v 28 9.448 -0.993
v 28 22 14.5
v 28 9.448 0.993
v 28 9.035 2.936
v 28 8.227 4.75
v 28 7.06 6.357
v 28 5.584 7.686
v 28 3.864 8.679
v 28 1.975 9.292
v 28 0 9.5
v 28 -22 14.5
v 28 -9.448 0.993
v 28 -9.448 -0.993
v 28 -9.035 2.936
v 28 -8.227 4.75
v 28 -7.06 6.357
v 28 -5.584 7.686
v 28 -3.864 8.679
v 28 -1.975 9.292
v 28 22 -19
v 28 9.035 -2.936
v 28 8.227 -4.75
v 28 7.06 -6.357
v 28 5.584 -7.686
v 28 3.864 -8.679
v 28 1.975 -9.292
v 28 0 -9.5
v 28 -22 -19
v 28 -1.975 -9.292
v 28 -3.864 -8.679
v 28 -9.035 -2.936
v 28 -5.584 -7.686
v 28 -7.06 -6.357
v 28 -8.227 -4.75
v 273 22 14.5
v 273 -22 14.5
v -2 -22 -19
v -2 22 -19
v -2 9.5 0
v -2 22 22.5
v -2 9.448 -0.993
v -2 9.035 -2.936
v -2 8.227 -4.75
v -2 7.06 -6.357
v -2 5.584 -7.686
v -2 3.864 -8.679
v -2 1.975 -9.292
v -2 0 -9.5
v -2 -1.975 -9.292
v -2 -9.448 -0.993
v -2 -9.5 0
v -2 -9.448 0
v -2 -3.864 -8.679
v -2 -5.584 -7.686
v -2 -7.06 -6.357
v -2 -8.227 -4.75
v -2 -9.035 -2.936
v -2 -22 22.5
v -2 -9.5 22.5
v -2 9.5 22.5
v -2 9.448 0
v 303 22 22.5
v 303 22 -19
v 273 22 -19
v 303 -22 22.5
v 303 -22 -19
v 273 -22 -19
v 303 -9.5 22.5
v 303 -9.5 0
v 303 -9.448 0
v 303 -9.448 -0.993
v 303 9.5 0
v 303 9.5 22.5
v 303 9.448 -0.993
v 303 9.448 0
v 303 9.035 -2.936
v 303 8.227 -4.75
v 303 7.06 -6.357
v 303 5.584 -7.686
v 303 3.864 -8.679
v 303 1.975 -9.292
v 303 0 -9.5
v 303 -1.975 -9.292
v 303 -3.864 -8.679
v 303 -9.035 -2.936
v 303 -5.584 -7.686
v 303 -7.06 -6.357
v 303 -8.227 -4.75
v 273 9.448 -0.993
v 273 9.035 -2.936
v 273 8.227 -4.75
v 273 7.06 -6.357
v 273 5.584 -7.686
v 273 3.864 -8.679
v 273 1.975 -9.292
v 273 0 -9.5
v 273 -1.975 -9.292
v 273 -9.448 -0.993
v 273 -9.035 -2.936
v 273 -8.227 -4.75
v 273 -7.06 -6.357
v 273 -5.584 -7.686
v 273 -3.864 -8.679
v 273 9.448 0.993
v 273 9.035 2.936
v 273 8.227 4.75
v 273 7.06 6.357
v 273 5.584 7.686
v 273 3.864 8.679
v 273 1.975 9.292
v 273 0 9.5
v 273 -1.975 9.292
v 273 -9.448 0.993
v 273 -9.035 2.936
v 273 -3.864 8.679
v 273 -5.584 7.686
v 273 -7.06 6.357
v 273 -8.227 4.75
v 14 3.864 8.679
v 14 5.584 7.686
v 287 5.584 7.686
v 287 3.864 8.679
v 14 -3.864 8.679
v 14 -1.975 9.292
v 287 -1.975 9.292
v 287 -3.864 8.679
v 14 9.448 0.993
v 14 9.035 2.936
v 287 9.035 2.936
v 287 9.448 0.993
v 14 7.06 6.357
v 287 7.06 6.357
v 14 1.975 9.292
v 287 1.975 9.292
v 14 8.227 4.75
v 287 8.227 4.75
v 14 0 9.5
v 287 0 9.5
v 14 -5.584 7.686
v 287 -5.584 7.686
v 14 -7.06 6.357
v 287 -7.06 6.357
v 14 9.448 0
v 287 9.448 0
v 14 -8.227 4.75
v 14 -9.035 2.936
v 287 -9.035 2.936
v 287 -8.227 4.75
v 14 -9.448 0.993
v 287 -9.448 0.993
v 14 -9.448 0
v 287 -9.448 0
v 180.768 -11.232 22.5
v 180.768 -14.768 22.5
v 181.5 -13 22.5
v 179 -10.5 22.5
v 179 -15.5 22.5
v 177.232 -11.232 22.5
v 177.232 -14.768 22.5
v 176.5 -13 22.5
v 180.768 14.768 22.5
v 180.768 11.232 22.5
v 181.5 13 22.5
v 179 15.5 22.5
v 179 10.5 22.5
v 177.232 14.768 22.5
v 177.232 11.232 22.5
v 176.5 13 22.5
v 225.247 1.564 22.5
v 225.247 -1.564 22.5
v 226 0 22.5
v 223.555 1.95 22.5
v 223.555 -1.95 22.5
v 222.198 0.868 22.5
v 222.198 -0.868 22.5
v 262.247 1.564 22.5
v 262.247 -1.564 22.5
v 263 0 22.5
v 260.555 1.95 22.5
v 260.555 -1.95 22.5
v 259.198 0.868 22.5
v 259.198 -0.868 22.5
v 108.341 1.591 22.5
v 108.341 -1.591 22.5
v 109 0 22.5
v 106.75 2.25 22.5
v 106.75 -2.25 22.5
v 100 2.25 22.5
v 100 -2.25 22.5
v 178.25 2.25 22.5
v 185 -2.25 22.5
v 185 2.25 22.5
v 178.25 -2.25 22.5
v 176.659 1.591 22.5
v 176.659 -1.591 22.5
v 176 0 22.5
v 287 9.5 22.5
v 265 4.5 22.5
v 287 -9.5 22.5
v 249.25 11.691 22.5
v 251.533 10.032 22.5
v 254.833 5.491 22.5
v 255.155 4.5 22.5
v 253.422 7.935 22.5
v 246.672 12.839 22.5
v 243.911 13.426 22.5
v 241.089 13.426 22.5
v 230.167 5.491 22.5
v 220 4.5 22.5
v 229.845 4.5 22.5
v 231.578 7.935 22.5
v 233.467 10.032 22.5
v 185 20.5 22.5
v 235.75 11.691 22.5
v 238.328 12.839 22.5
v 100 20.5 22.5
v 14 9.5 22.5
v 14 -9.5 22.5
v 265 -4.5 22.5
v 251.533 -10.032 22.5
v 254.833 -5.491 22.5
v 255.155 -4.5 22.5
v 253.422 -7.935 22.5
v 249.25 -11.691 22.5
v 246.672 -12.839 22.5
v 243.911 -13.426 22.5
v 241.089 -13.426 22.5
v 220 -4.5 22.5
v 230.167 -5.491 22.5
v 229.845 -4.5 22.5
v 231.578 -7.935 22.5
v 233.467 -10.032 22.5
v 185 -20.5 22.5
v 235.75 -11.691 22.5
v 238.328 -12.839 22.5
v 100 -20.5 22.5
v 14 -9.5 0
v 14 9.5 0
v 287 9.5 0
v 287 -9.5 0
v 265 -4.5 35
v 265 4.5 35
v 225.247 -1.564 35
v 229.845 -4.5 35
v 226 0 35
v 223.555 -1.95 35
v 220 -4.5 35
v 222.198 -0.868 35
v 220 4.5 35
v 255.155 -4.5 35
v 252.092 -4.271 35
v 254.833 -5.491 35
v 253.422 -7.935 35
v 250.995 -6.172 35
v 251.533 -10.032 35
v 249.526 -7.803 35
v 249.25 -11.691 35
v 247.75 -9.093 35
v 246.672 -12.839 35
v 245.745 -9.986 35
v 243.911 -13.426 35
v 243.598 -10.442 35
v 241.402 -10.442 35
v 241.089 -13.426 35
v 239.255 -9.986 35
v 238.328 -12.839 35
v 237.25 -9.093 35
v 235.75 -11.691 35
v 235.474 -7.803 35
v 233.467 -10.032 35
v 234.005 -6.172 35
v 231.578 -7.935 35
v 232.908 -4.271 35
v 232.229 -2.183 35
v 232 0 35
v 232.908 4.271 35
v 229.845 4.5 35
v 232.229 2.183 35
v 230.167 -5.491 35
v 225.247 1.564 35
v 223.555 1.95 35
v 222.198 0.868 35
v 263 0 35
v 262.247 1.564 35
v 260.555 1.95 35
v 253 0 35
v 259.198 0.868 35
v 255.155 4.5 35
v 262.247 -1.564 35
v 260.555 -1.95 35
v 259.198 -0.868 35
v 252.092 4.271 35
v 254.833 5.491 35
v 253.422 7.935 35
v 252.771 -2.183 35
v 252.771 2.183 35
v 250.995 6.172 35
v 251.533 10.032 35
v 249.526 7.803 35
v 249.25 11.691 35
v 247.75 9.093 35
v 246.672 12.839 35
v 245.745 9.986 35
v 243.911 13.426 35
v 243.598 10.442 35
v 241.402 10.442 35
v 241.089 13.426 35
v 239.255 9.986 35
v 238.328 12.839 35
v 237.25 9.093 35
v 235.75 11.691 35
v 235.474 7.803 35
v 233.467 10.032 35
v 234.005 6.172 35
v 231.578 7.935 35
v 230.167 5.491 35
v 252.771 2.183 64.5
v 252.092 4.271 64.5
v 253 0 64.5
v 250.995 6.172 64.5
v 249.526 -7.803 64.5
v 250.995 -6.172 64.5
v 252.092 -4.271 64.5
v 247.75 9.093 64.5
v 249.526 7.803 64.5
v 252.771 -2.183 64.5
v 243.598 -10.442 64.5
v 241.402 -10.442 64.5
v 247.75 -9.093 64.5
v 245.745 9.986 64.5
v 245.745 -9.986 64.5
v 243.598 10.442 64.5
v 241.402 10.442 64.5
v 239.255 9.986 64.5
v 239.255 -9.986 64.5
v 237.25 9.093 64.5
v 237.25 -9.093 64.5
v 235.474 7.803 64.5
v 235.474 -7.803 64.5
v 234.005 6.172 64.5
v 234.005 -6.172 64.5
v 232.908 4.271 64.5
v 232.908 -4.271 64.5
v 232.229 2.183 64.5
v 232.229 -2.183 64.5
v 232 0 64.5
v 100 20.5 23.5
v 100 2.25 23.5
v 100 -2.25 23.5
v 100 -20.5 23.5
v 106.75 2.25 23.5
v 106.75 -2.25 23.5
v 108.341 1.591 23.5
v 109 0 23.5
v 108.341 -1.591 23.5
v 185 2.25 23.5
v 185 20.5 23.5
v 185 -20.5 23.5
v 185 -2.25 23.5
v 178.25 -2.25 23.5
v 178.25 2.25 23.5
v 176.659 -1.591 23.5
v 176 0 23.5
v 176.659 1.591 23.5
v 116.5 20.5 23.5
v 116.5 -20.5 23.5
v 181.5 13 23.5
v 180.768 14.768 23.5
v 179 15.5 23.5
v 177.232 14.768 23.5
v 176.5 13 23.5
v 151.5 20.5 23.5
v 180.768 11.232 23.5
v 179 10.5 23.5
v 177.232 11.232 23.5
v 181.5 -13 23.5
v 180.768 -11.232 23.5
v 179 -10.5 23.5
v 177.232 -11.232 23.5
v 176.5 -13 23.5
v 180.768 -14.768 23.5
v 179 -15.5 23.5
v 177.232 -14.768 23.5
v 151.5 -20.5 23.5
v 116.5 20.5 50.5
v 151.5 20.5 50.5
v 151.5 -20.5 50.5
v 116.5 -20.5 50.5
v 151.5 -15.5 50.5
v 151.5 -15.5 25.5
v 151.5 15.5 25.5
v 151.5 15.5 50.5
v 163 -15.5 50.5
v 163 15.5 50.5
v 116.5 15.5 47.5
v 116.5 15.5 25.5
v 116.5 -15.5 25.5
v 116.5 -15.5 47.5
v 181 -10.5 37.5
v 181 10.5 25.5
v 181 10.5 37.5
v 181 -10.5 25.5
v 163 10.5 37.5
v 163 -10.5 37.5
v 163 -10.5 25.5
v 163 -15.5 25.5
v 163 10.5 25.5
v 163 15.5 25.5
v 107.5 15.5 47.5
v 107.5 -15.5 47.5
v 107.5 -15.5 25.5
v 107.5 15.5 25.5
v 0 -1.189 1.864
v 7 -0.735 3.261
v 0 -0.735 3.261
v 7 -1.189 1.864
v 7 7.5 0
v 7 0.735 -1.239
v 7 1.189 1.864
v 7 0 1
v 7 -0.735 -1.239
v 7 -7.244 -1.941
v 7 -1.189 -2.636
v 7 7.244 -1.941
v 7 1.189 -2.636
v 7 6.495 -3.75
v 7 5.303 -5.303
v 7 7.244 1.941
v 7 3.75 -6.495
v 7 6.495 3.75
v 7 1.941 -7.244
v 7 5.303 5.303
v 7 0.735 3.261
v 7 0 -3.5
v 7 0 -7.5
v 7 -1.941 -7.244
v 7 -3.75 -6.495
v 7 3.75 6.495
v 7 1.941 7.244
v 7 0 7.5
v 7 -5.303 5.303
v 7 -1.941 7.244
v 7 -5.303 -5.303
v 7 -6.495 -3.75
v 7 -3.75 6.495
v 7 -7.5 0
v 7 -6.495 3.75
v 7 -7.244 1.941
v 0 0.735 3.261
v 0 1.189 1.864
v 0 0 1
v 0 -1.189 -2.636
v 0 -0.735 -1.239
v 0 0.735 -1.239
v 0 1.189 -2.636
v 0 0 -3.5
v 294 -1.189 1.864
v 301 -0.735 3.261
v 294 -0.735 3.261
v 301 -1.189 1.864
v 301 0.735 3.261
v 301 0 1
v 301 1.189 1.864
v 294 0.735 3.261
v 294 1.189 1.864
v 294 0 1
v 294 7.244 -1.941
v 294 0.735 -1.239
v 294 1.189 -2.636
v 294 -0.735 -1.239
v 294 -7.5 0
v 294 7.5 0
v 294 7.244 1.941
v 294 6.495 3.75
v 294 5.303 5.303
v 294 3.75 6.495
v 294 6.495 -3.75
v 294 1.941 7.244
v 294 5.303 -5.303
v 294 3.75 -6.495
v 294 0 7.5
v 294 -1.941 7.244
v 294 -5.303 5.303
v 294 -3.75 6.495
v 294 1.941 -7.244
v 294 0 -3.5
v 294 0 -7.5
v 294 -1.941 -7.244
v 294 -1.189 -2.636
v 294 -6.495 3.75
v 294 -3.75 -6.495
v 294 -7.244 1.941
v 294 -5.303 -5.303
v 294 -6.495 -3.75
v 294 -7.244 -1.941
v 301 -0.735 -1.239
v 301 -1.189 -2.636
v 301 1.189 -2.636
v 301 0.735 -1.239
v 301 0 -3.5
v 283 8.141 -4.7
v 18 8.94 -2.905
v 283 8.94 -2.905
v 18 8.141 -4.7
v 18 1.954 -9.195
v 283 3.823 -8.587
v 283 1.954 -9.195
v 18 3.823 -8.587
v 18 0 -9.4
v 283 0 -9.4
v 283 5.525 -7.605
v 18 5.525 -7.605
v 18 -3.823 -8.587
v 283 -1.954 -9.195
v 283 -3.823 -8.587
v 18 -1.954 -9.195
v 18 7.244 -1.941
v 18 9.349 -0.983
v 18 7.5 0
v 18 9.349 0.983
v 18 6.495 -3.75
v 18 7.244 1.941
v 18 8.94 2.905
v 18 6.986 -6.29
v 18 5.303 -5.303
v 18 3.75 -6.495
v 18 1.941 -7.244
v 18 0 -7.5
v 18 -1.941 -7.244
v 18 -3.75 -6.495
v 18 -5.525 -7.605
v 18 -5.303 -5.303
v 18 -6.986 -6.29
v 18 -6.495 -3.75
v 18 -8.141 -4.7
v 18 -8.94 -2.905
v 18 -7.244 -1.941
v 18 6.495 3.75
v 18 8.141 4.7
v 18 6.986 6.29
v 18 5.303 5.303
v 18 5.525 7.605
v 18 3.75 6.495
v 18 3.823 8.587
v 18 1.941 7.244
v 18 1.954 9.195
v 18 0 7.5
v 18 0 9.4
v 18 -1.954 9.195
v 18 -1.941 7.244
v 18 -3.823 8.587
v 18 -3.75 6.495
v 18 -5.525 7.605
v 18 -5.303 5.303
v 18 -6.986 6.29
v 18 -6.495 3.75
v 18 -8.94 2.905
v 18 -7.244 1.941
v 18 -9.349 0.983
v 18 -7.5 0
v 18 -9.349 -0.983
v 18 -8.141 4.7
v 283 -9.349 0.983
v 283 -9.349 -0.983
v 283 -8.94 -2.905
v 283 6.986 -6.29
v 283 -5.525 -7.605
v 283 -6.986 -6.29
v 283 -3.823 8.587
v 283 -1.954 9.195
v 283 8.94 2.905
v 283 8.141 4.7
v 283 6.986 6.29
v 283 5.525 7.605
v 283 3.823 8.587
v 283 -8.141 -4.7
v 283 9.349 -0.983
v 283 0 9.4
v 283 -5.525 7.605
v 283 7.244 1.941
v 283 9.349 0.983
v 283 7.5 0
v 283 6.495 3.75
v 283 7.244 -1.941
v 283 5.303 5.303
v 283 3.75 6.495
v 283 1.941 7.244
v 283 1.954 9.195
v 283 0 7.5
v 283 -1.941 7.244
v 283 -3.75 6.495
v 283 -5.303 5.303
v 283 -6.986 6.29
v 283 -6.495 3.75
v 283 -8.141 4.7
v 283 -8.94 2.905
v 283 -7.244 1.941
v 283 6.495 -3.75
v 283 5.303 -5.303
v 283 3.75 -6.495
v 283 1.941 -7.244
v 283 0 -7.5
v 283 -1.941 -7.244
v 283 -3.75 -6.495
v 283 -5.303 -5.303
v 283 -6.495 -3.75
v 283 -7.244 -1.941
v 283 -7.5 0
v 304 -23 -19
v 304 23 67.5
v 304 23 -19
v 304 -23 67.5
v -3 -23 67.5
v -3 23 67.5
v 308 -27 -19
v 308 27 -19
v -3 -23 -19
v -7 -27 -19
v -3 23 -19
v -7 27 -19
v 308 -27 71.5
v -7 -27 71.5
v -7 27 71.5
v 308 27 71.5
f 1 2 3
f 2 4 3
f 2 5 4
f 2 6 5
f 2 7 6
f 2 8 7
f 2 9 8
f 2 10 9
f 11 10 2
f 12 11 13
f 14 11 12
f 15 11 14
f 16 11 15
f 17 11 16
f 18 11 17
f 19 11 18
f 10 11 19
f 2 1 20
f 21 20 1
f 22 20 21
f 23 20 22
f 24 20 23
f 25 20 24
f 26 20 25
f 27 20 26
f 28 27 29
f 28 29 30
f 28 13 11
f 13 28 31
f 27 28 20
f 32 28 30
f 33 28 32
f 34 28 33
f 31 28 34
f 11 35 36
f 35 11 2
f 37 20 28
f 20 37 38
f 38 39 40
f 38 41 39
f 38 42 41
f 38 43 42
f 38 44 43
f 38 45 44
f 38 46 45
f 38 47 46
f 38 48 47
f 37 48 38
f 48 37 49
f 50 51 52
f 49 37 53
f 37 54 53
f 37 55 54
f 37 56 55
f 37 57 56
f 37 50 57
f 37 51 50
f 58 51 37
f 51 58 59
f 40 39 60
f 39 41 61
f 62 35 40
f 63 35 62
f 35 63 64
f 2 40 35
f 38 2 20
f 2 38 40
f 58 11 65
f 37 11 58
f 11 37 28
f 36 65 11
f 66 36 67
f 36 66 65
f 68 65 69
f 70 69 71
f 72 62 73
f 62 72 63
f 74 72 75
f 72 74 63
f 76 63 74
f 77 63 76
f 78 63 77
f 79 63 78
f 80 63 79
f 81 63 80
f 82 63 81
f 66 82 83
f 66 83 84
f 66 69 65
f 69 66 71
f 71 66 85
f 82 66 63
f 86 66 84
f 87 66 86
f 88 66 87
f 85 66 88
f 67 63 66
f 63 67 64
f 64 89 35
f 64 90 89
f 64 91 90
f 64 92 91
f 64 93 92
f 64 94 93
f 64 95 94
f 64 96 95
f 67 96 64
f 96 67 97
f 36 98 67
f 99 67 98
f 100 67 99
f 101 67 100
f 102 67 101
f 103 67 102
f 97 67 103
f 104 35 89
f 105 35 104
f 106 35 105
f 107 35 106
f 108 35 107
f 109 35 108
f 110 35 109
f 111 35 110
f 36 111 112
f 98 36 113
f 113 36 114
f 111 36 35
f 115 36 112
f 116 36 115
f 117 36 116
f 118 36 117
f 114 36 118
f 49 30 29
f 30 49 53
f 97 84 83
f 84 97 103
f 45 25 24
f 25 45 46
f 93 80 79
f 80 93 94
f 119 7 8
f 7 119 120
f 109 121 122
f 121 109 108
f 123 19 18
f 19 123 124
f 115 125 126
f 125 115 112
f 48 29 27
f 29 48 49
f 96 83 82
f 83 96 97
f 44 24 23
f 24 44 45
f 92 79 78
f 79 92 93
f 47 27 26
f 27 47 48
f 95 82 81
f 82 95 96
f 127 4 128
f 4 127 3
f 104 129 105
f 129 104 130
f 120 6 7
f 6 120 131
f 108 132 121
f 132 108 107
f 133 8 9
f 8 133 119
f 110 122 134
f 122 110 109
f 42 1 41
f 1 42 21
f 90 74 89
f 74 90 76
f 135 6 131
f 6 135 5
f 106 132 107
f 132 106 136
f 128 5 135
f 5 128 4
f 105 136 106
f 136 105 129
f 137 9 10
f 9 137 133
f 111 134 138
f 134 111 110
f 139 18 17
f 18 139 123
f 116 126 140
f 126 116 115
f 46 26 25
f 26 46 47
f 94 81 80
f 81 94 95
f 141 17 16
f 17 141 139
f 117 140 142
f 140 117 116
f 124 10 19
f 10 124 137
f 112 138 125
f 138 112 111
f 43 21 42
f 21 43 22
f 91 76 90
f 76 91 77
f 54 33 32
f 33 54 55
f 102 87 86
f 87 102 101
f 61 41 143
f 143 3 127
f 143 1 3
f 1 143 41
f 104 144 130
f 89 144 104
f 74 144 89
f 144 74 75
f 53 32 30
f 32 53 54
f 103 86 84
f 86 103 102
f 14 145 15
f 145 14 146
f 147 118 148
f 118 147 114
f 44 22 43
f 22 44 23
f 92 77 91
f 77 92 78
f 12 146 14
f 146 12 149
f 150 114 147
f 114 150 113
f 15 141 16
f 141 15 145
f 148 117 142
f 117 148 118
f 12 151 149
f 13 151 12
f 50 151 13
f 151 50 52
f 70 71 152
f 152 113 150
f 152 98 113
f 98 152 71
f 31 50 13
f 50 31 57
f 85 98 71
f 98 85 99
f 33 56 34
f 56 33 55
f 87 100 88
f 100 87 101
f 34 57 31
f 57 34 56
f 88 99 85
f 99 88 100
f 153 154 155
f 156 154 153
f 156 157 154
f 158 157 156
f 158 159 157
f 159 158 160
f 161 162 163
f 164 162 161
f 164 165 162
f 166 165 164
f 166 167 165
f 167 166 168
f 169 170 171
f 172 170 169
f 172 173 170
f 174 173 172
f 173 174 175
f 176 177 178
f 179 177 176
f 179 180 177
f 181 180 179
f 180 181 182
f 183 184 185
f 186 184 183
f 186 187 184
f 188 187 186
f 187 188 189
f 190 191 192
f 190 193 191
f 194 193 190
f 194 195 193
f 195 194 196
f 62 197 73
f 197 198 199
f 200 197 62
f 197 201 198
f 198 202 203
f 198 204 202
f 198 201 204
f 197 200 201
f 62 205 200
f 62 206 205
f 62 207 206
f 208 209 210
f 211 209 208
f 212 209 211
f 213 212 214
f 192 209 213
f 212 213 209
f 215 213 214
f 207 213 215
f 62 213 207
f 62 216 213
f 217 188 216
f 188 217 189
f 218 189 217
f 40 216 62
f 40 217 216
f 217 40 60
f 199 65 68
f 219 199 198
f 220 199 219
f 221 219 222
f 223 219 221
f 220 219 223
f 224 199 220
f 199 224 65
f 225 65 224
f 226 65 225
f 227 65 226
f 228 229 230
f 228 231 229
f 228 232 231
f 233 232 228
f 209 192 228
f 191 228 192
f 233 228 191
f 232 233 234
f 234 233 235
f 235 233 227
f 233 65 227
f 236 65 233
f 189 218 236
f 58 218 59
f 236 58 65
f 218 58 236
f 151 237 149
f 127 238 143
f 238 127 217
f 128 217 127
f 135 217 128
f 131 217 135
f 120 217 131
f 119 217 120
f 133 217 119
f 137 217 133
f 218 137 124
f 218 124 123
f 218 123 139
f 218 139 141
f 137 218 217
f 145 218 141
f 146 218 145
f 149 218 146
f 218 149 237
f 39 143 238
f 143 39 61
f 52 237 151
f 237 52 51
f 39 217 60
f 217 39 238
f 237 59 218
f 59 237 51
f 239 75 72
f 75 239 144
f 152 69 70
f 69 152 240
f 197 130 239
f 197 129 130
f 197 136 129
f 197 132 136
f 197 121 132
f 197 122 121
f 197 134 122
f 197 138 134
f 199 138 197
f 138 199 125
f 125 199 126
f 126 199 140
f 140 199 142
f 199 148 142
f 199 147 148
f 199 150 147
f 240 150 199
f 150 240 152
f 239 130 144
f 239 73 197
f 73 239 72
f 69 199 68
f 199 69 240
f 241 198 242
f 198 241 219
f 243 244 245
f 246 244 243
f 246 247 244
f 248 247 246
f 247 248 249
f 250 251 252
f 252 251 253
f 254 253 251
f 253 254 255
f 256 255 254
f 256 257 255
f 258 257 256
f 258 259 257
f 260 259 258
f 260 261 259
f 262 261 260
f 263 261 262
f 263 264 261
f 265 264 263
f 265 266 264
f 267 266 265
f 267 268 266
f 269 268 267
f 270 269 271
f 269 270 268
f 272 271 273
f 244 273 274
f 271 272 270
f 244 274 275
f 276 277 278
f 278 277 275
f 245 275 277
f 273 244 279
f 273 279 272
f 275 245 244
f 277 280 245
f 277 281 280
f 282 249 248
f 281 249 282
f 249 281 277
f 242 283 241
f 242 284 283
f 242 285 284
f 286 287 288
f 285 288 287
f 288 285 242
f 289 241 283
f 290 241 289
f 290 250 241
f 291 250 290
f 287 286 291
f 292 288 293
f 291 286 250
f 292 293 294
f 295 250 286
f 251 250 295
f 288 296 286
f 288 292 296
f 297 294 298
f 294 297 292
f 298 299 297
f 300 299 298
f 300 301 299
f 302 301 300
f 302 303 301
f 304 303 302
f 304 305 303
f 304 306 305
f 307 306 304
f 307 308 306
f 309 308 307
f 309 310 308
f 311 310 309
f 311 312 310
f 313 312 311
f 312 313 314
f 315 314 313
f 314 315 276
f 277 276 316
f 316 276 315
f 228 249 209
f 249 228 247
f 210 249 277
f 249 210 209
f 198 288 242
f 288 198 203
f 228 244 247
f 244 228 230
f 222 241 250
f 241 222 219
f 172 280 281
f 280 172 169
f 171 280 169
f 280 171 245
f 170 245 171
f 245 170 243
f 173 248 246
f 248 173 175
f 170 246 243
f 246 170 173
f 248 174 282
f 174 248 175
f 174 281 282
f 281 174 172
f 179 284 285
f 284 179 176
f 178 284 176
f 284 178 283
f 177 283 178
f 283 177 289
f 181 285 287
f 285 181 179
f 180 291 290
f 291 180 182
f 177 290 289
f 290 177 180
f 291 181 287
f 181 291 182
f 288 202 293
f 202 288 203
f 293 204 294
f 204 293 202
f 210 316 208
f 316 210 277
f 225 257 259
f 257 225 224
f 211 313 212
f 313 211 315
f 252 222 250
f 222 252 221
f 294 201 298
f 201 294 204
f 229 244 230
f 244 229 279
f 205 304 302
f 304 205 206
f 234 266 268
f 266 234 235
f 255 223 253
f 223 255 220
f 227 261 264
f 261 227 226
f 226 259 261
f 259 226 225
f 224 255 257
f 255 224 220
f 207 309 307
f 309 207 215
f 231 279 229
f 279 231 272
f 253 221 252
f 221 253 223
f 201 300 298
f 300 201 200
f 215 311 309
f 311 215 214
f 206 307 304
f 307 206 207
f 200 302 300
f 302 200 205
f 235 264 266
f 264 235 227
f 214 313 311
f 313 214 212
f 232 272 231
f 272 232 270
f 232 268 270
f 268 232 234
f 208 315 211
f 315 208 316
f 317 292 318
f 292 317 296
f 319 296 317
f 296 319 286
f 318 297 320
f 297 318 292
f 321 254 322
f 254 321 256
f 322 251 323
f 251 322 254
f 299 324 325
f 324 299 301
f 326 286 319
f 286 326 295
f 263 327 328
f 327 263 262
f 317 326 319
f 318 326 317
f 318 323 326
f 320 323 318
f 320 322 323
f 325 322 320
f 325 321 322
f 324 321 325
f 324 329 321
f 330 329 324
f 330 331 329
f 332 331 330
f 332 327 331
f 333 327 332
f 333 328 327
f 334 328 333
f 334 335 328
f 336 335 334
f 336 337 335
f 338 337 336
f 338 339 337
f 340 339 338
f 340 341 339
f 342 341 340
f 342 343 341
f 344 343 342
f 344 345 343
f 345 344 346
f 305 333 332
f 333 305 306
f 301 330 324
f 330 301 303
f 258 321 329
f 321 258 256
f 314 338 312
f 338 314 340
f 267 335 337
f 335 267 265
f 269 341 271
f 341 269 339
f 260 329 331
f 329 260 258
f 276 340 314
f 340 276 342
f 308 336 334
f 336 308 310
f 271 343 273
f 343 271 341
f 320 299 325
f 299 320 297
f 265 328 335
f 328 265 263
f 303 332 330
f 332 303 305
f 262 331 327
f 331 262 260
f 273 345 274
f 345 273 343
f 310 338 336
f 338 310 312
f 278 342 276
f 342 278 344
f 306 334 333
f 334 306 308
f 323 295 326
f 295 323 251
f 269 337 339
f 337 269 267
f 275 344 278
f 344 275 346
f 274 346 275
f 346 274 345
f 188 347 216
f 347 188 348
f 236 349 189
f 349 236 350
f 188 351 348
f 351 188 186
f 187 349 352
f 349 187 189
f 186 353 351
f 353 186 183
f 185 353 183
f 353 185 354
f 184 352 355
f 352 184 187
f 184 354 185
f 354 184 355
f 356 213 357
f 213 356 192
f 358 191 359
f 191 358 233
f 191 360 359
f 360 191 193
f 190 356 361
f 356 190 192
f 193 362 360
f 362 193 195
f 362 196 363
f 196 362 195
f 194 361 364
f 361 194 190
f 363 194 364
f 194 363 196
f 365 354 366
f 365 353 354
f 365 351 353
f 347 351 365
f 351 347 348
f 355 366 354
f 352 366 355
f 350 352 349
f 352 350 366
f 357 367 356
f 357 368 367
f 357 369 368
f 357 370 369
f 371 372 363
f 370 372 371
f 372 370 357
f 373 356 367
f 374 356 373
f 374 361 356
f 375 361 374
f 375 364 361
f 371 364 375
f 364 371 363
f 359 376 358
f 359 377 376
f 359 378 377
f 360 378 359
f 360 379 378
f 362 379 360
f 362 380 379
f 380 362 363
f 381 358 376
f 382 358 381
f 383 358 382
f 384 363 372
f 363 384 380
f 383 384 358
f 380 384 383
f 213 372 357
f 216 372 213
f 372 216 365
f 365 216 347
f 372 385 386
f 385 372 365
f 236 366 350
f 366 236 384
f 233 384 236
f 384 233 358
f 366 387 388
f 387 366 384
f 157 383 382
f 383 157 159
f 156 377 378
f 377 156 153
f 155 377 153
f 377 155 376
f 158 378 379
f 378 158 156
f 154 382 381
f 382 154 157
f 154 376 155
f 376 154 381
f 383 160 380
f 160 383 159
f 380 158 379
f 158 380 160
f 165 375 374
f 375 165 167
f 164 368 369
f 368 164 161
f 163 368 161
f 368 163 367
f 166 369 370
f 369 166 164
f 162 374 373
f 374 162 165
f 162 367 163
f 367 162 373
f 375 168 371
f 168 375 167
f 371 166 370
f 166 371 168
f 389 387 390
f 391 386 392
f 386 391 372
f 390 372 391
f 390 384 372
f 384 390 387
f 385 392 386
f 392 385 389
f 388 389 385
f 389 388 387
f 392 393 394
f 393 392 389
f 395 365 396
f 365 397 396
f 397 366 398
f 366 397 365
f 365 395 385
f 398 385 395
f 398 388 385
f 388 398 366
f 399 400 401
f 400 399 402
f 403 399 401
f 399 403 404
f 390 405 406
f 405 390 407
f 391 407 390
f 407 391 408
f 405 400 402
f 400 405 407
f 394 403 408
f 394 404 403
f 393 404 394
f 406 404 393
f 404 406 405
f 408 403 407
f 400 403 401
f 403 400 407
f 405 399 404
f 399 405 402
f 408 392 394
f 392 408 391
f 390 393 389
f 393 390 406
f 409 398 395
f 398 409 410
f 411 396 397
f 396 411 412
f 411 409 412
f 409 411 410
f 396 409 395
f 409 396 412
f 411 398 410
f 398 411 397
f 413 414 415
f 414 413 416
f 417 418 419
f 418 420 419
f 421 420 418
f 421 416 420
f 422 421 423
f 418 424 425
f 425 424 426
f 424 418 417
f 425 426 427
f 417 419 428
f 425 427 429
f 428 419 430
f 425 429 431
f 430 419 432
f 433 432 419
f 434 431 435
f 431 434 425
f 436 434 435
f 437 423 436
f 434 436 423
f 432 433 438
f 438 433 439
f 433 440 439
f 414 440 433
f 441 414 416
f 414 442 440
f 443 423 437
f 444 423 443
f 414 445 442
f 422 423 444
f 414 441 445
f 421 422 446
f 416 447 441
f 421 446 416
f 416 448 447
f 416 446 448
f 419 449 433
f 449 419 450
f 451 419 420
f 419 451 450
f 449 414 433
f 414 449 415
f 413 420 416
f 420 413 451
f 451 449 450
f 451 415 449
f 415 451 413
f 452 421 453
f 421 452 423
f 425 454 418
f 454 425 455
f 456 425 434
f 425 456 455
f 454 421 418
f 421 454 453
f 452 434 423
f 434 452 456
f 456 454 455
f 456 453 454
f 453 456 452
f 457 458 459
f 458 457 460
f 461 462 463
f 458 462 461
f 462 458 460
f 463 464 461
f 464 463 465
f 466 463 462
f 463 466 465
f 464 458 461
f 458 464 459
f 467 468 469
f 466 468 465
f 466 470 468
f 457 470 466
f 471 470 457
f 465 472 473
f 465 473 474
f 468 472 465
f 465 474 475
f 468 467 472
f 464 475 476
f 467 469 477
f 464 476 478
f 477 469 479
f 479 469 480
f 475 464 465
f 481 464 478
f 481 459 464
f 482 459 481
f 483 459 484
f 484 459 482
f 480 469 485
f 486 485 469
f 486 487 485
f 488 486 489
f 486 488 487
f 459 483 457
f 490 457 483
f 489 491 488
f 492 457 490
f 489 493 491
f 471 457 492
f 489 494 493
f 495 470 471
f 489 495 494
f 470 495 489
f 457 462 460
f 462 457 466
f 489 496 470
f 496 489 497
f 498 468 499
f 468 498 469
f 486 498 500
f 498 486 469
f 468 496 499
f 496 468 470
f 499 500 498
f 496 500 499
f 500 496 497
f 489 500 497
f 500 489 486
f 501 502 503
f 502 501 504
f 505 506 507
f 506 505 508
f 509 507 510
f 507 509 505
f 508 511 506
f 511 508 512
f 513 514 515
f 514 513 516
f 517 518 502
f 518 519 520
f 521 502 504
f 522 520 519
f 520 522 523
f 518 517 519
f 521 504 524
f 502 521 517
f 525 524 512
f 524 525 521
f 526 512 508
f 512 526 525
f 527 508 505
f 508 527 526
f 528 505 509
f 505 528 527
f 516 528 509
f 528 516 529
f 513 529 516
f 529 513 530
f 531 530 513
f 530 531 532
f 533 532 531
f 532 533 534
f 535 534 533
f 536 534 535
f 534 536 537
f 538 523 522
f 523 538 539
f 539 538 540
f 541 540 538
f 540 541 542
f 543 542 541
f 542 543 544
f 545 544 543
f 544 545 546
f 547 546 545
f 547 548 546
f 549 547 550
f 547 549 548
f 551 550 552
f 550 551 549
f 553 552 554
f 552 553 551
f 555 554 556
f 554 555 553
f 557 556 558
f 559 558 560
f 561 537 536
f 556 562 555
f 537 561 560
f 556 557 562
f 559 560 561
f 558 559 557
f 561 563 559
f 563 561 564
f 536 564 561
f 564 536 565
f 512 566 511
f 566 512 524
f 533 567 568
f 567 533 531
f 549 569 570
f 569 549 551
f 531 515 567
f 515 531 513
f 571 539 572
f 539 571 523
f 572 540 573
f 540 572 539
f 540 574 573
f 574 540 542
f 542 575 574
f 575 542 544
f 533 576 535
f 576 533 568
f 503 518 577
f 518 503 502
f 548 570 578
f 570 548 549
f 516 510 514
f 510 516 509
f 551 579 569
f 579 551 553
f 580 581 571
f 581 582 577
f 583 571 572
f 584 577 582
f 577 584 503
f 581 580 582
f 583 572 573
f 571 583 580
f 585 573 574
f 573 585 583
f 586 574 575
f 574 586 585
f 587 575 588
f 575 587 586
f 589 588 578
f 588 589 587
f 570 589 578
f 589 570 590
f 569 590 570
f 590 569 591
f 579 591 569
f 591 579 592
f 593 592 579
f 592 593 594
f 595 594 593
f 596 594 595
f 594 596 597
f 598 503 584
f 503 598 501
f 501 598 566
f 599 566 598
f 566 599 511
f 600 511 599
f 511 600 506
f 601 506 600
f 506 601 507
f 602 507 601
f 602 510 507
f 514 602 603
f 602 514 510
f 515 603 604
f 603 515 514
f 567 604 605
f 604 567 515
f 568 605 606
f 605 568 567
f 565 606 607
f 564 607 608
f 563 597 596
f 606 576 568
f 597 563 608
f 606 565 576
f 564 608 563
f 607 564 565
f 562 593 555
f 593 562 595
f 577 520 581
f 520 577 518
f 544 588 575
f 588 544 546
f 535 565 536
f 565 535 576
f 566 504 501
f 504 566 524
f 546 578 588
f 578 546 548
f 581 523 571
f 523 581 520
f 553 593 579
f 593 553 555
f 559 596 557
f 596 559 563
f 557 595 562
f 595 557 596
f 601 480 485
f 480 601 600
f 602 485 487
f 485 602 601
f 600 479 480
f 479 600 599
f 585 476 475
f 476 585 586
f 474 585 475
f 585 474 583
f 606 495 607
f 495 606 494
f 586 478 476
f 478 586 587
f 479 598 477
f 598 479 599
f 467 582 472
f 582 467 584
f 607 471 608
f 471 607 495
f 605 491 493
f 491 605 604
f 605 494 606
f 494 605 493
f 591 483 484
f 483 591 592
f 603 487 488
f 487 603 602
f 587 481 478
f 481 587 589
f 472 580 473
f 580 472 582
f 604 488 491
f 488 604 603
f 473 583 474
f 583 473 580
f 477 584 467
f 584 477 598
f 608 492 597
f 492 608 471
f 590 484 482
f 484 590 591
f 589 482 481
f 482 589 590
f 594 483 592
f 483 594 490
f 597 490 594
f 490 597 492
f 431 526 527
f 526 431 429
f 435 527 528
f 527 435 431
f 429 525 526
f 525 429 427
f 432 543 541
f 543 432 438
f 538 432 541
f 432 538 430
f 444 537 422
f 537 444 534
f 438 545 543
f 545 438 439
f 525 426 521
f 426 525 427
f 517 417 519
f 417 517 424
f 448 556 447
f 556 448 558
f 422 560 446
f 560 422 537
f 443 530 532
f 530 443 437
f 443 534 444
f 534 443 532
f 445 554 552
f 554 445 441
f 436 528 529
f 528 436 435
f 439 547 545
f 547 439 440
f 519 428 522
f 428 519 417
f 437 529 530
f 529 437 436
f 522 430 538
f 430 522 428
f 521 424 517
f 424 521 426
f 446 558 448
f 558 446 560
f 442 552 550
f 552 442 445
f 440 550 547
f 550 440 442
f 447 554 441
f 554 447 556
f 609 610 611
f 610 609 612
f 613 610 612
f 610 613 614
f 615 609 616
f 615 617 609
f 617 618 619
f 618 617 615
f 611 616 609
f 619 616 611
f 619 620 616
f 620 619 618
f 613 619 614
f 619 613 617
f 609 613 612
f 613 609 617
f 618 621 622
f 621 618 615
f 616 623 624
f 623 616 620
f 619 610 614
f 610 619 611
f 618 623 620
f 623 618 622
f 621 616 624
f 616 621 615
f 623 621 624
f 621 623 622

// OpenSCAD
// file: componentes.scad
module tubo_germicida() {
    LONGITUD_VIDRIO = 265;
    DIAMETRO_VIDRIO = 18.8;
    LONGITUD_METAL = 11;
    DIAMETRO_METAL = 15;
    LONGITUD_PIN = 7;
    DIAMETRO_PIN = 2.5;
    SEPARACION_PIN = 4.5;
    module pin() {
        cylinder(h=LONGITUD_PIN, d=DIAMETRO_PIN);
    }
    module metalsito() {
        color([1,1,1]*.8)
        cylinder(h=LONGITUD_METAL, d=DIAMETRO_METAL);
    }
    module tubo_de_vidrio() {
        color([1,1,1], alpha=.4)
        cylinder(h=LONGITUD_VIDRIO, d=DIAMETRO_VIDRIO);
    }
    
    translate([-SEPARACION_PIN/2,0,0])
        pin();
    translate([SEPARACION_PIN/2,0,0])
        pin();
    translate([-SEPARACION_PIN/2,0,2*LONGITUD_METAL+LONGITUD_VIDRIO+LONGITUD_PIN])
        pin();
    translate([SEPARACION_PIN/2,0,2*LONGITUD_METAL+LONGITUD_VIDRIO+LONGITUD_PIN])
        pin();
    
    translate([0,0,LONGITUD_METAL+LONGITUD_PIN])
        tubo_de_vidrio();

    translate([0,0,LONGITUD_METAL+LONGITUD_VIDRIO+LONGITUD_PIN])
        metalsito();
    translate([0,0,LONGITUD_PIN])
        metalsito();
}

module reactancia() {
    module ranura() {
        translate([0,0,-1]) {
            cube([9-4.5/2,4.5,3]);
            translate([9-4.5/2,4.5/2,0])
                cylinder(h=3,d=4.5);
        }
    }
    module agujero() {
        translate([0,0,-1])
            cylinder(h=3,d=5);
    }
    color([1,1,1]) {
        difference() {
            cube([85,41,1]);
            translate([0,41/2-4.5/2,0])
                ranura();
            translate([85,41/2+4.5/2,0])
                rotate(a=180,v=[0,0,1])
                    ranura();
            translate([76.5+5/2,5+5/2,0])
                agujero();
            translate([76.5+5/2,41-5-5/2,0])
                agujero();
        }
        translate([16.5,0,0])
            cube([35,41,28]);
        translate([63,41/2-21/2,3])
            cube([18,21,12]);
        translate([51,(41-31)/2,3])
            cube([12,31,25]);
        translate([16.5-9,(41-31)/2,3])
            cube([9,31,22]);
    }
}

module arrancador() {
    color([.3,.4,1], alpha=.5)
        cylinder(h=35,d=21);
}

module zocalo_arrancador() {
    color([1,1,1]) {
        difference() {
            cube([45,9,12.5]);
            translate([45/2-37/2,9/2,-1])
                cylinder(h=15,d=4);
            translate([45/2+37/2,9/2,-1])
                cylinder(h=15,d=4);
        }
        translate([45/2,9/2,0])
            cylinder(h=12.5,d=27);
    }
}

module zocalo_con_arrancador() {
    zocalo_arrancador();
    translate([45/2,9/2,42-35])
        arrancador();
}
// main file
use <componentes.scad>

DIAMETRO_TUBO = 19;
LONGITUD_TUBO = 265+2*11+2*7;
ESPESOR_MINIMO = 4;
EXCESO_LONGITUDINAL = 2;
ANCHO_INTERNO_Y = 44;
ALTO_INTERNO_Z = 45;
ESPESOR_BASE = 8;
SEPARACION_BASE_TUBO = 5;
DISTANCIA_CUBRIR_TUBO = 11+7+10;
LUZ_TAPA_BASE = 1;
POSICION_ARRANCADOR_X = 220;
POSICION_REACTANCIA_X = 100;

module gabinete_base() {
    difference() {
        union() {
            translate([-EXCESO_LONGITUDINAL,-ANCHO_INTERNO_Y/2,SEPARACION_BASE_TUBO+DIAMETRO_TUBO/2])
                cube([LONGITUD_TUBO+2*EXCESO_LONGITUDINAL,ANCHO_INTERNO_Y, ESPESOR_BASE]);
            
            difference() {
                translate([0,-ANCHO_INTERNO_Y/2,DIAMETRO_TUBO/2+SEPARACION_BASE_TUBO-(DIAMETRO_TUBO/2+SEPARACION_BASE_TUBO+DIAMETRO_TUBO)]) {
                    translate([-EXCESO_LONGITUDINAL,0,0])
                        cube([EXCESO_LONGITUDINAL+DISTANCIA_CUBRIR_TUBO,ANCHO_INTERNO_Y,DIAMETRO_TUBO/2+SEPARACION_BASE_TUBO+DIAMETRO_TUBO]);
                    translate([LONGITUD_TUBO+EXCESO_LONGITUDINAL-(EXCESO_LONGITUDINAL+DISTANCIA_CUBRIR_TUBO),0,0])
                        cube([EXCESO_LONGITUDINAL+DISTANCIA_CUBRIR_TUBO,ANCHO_INTERNO_Y,DIAMETRO_TUBO/2+SEPARACION_BASE_TUBO+DIAMETRO_TUBO]);
                }
                translate([-EXCESO_LONGITUDINAL-1,0,0])
                rotate(a=90,v=[0,1,0])
                    cylinder(h=LONGITUD_TUBO+2*EXCESO_LONGITUDINAL+2,d=DIAMETRO_TUBO);
            }
        }
        translate([0,-DIAMETRO_TUBO/2,0]) {
        translate([-EXCESO_LONGITUDINAL,0,0])
            cube([EXCESO_LONGITUDINAL+DISTANCIA_CUBRIR_TUBO/2,DIAMETRO_TUBO,DIAMETRO_TUBO/2+SEPARACION_BASE_TUBO+ESPESOR_BASE]);
        translate([LONGITUD_TUBO+EXCESO_LONGITUDINAL-(EXCESO_LONGITUDINAL+DISTANCIA_CUBRIR_TUBO/2),0,0])
            cube([EXCESO_LONGITUDINAL+DISTANCIA_CUBRIR_TUBO/2,DIAMETRO_TUBO,DIAMETRO_TUBO/2+SEPARACION_BASE_TUBO+ESPESOR_BASE]);
        }
    }
}

module gabinete_tapa() {
    altura_tapa = SEPARACION_BASE_TUBO+3/2*DIAMETRO_TUBO+ESPESOR_BASE+ALTO_INTERNO_Z;
    offset_z = -DIAMETRO_TUBO/2-DIAMETRO_TUBO/2;
    translate([-LUZ_TAPA_BASE-EXCESO_LONGITUDINAL,-LUZ_TAPA_BASE-ANCHO_INTERNO_Y/2-ESPESOR_MINIMO,offset_z])
        cube([2*LUZ_TAPA_BASE+2*EXCESO_LONGITUDINAL+LONGITUD_TUBO,ESPESOR_MINIMO,altura_tapa]);
    translate([-LUZ_TAPA_BASE-EXCESO_LONGITUDINAL,LUZ_TAPA_BASE+ANCHO_INTERNO_Y/2,offset_z])
        cube([2*LUZ_TAPA_BASE+2*EXCESO_LONGITUDINAL+LONGITUD_TUBO,ESPESOR_MINIMO,altura_tapa]);
    translate([-EXCESO_LONGITUDINAL-ESPESOR_MINIMO-LUZ_TAPA_BASE,-LUZ_TAPA_BASE-ANCHO_INTERNO_Y/2-ESPESOR_MINIMO,offset_z])
        cube([ESPESOR_MINIMO,2*LUZ_TAPA_BASE+2*ESPESOR_MINIMO+ANCHO_INTERNO_Y,altura_tapa]);
    translate([LUZ_TAPA_BASE+EXCESO_LONGITUDINAL+LONGITUD_TUBO,-LUZ_TAPA_BASE-ANCHO_INTERNO_Y/2-ESPESOR_MINIMO,offset_z])
        cube([ESPESOR_MINIMO,2*LUZ_TAPA_BASE+2*ESPESOR_MINIMO+ANCHO_INTERNO_Y,altura_tapa]);
    translate((ESPESOR_MINIMO+LUZ_TAPA_BASE)*[-1,-1,0]+[-EXCESO_LONGITUDINAL,-ANCHO_INTERNO_Y/2,offset_z+altura_tapa])
		cube(2*(ESPESOR_MINIMO+LUZ_TAPA_BASE)*[1,1,0]+[2*EXCESO_LONGITUDINAL+LONGITUD_TUBO,ANCHO_INTERNO_Y,ESPESOR_MINIMO]);
}

gabinete_base();
translate([0,0,SEPARACION_BASE_TUBO+DIAMETRO_TUBO/2+ESPESOR_BASE]) {
    translate([POSICION_ARRANCADOR_X,-9/2,0])
        zocalo_con_arrancador();
    translate([POSICION_REACTANCIA_X,-41/2,0])
        reactancia();
}
rotate(a=90, v=[0,1,0])
    tubo_germicida();

color(alpha=.5) gabinete_tapa();
